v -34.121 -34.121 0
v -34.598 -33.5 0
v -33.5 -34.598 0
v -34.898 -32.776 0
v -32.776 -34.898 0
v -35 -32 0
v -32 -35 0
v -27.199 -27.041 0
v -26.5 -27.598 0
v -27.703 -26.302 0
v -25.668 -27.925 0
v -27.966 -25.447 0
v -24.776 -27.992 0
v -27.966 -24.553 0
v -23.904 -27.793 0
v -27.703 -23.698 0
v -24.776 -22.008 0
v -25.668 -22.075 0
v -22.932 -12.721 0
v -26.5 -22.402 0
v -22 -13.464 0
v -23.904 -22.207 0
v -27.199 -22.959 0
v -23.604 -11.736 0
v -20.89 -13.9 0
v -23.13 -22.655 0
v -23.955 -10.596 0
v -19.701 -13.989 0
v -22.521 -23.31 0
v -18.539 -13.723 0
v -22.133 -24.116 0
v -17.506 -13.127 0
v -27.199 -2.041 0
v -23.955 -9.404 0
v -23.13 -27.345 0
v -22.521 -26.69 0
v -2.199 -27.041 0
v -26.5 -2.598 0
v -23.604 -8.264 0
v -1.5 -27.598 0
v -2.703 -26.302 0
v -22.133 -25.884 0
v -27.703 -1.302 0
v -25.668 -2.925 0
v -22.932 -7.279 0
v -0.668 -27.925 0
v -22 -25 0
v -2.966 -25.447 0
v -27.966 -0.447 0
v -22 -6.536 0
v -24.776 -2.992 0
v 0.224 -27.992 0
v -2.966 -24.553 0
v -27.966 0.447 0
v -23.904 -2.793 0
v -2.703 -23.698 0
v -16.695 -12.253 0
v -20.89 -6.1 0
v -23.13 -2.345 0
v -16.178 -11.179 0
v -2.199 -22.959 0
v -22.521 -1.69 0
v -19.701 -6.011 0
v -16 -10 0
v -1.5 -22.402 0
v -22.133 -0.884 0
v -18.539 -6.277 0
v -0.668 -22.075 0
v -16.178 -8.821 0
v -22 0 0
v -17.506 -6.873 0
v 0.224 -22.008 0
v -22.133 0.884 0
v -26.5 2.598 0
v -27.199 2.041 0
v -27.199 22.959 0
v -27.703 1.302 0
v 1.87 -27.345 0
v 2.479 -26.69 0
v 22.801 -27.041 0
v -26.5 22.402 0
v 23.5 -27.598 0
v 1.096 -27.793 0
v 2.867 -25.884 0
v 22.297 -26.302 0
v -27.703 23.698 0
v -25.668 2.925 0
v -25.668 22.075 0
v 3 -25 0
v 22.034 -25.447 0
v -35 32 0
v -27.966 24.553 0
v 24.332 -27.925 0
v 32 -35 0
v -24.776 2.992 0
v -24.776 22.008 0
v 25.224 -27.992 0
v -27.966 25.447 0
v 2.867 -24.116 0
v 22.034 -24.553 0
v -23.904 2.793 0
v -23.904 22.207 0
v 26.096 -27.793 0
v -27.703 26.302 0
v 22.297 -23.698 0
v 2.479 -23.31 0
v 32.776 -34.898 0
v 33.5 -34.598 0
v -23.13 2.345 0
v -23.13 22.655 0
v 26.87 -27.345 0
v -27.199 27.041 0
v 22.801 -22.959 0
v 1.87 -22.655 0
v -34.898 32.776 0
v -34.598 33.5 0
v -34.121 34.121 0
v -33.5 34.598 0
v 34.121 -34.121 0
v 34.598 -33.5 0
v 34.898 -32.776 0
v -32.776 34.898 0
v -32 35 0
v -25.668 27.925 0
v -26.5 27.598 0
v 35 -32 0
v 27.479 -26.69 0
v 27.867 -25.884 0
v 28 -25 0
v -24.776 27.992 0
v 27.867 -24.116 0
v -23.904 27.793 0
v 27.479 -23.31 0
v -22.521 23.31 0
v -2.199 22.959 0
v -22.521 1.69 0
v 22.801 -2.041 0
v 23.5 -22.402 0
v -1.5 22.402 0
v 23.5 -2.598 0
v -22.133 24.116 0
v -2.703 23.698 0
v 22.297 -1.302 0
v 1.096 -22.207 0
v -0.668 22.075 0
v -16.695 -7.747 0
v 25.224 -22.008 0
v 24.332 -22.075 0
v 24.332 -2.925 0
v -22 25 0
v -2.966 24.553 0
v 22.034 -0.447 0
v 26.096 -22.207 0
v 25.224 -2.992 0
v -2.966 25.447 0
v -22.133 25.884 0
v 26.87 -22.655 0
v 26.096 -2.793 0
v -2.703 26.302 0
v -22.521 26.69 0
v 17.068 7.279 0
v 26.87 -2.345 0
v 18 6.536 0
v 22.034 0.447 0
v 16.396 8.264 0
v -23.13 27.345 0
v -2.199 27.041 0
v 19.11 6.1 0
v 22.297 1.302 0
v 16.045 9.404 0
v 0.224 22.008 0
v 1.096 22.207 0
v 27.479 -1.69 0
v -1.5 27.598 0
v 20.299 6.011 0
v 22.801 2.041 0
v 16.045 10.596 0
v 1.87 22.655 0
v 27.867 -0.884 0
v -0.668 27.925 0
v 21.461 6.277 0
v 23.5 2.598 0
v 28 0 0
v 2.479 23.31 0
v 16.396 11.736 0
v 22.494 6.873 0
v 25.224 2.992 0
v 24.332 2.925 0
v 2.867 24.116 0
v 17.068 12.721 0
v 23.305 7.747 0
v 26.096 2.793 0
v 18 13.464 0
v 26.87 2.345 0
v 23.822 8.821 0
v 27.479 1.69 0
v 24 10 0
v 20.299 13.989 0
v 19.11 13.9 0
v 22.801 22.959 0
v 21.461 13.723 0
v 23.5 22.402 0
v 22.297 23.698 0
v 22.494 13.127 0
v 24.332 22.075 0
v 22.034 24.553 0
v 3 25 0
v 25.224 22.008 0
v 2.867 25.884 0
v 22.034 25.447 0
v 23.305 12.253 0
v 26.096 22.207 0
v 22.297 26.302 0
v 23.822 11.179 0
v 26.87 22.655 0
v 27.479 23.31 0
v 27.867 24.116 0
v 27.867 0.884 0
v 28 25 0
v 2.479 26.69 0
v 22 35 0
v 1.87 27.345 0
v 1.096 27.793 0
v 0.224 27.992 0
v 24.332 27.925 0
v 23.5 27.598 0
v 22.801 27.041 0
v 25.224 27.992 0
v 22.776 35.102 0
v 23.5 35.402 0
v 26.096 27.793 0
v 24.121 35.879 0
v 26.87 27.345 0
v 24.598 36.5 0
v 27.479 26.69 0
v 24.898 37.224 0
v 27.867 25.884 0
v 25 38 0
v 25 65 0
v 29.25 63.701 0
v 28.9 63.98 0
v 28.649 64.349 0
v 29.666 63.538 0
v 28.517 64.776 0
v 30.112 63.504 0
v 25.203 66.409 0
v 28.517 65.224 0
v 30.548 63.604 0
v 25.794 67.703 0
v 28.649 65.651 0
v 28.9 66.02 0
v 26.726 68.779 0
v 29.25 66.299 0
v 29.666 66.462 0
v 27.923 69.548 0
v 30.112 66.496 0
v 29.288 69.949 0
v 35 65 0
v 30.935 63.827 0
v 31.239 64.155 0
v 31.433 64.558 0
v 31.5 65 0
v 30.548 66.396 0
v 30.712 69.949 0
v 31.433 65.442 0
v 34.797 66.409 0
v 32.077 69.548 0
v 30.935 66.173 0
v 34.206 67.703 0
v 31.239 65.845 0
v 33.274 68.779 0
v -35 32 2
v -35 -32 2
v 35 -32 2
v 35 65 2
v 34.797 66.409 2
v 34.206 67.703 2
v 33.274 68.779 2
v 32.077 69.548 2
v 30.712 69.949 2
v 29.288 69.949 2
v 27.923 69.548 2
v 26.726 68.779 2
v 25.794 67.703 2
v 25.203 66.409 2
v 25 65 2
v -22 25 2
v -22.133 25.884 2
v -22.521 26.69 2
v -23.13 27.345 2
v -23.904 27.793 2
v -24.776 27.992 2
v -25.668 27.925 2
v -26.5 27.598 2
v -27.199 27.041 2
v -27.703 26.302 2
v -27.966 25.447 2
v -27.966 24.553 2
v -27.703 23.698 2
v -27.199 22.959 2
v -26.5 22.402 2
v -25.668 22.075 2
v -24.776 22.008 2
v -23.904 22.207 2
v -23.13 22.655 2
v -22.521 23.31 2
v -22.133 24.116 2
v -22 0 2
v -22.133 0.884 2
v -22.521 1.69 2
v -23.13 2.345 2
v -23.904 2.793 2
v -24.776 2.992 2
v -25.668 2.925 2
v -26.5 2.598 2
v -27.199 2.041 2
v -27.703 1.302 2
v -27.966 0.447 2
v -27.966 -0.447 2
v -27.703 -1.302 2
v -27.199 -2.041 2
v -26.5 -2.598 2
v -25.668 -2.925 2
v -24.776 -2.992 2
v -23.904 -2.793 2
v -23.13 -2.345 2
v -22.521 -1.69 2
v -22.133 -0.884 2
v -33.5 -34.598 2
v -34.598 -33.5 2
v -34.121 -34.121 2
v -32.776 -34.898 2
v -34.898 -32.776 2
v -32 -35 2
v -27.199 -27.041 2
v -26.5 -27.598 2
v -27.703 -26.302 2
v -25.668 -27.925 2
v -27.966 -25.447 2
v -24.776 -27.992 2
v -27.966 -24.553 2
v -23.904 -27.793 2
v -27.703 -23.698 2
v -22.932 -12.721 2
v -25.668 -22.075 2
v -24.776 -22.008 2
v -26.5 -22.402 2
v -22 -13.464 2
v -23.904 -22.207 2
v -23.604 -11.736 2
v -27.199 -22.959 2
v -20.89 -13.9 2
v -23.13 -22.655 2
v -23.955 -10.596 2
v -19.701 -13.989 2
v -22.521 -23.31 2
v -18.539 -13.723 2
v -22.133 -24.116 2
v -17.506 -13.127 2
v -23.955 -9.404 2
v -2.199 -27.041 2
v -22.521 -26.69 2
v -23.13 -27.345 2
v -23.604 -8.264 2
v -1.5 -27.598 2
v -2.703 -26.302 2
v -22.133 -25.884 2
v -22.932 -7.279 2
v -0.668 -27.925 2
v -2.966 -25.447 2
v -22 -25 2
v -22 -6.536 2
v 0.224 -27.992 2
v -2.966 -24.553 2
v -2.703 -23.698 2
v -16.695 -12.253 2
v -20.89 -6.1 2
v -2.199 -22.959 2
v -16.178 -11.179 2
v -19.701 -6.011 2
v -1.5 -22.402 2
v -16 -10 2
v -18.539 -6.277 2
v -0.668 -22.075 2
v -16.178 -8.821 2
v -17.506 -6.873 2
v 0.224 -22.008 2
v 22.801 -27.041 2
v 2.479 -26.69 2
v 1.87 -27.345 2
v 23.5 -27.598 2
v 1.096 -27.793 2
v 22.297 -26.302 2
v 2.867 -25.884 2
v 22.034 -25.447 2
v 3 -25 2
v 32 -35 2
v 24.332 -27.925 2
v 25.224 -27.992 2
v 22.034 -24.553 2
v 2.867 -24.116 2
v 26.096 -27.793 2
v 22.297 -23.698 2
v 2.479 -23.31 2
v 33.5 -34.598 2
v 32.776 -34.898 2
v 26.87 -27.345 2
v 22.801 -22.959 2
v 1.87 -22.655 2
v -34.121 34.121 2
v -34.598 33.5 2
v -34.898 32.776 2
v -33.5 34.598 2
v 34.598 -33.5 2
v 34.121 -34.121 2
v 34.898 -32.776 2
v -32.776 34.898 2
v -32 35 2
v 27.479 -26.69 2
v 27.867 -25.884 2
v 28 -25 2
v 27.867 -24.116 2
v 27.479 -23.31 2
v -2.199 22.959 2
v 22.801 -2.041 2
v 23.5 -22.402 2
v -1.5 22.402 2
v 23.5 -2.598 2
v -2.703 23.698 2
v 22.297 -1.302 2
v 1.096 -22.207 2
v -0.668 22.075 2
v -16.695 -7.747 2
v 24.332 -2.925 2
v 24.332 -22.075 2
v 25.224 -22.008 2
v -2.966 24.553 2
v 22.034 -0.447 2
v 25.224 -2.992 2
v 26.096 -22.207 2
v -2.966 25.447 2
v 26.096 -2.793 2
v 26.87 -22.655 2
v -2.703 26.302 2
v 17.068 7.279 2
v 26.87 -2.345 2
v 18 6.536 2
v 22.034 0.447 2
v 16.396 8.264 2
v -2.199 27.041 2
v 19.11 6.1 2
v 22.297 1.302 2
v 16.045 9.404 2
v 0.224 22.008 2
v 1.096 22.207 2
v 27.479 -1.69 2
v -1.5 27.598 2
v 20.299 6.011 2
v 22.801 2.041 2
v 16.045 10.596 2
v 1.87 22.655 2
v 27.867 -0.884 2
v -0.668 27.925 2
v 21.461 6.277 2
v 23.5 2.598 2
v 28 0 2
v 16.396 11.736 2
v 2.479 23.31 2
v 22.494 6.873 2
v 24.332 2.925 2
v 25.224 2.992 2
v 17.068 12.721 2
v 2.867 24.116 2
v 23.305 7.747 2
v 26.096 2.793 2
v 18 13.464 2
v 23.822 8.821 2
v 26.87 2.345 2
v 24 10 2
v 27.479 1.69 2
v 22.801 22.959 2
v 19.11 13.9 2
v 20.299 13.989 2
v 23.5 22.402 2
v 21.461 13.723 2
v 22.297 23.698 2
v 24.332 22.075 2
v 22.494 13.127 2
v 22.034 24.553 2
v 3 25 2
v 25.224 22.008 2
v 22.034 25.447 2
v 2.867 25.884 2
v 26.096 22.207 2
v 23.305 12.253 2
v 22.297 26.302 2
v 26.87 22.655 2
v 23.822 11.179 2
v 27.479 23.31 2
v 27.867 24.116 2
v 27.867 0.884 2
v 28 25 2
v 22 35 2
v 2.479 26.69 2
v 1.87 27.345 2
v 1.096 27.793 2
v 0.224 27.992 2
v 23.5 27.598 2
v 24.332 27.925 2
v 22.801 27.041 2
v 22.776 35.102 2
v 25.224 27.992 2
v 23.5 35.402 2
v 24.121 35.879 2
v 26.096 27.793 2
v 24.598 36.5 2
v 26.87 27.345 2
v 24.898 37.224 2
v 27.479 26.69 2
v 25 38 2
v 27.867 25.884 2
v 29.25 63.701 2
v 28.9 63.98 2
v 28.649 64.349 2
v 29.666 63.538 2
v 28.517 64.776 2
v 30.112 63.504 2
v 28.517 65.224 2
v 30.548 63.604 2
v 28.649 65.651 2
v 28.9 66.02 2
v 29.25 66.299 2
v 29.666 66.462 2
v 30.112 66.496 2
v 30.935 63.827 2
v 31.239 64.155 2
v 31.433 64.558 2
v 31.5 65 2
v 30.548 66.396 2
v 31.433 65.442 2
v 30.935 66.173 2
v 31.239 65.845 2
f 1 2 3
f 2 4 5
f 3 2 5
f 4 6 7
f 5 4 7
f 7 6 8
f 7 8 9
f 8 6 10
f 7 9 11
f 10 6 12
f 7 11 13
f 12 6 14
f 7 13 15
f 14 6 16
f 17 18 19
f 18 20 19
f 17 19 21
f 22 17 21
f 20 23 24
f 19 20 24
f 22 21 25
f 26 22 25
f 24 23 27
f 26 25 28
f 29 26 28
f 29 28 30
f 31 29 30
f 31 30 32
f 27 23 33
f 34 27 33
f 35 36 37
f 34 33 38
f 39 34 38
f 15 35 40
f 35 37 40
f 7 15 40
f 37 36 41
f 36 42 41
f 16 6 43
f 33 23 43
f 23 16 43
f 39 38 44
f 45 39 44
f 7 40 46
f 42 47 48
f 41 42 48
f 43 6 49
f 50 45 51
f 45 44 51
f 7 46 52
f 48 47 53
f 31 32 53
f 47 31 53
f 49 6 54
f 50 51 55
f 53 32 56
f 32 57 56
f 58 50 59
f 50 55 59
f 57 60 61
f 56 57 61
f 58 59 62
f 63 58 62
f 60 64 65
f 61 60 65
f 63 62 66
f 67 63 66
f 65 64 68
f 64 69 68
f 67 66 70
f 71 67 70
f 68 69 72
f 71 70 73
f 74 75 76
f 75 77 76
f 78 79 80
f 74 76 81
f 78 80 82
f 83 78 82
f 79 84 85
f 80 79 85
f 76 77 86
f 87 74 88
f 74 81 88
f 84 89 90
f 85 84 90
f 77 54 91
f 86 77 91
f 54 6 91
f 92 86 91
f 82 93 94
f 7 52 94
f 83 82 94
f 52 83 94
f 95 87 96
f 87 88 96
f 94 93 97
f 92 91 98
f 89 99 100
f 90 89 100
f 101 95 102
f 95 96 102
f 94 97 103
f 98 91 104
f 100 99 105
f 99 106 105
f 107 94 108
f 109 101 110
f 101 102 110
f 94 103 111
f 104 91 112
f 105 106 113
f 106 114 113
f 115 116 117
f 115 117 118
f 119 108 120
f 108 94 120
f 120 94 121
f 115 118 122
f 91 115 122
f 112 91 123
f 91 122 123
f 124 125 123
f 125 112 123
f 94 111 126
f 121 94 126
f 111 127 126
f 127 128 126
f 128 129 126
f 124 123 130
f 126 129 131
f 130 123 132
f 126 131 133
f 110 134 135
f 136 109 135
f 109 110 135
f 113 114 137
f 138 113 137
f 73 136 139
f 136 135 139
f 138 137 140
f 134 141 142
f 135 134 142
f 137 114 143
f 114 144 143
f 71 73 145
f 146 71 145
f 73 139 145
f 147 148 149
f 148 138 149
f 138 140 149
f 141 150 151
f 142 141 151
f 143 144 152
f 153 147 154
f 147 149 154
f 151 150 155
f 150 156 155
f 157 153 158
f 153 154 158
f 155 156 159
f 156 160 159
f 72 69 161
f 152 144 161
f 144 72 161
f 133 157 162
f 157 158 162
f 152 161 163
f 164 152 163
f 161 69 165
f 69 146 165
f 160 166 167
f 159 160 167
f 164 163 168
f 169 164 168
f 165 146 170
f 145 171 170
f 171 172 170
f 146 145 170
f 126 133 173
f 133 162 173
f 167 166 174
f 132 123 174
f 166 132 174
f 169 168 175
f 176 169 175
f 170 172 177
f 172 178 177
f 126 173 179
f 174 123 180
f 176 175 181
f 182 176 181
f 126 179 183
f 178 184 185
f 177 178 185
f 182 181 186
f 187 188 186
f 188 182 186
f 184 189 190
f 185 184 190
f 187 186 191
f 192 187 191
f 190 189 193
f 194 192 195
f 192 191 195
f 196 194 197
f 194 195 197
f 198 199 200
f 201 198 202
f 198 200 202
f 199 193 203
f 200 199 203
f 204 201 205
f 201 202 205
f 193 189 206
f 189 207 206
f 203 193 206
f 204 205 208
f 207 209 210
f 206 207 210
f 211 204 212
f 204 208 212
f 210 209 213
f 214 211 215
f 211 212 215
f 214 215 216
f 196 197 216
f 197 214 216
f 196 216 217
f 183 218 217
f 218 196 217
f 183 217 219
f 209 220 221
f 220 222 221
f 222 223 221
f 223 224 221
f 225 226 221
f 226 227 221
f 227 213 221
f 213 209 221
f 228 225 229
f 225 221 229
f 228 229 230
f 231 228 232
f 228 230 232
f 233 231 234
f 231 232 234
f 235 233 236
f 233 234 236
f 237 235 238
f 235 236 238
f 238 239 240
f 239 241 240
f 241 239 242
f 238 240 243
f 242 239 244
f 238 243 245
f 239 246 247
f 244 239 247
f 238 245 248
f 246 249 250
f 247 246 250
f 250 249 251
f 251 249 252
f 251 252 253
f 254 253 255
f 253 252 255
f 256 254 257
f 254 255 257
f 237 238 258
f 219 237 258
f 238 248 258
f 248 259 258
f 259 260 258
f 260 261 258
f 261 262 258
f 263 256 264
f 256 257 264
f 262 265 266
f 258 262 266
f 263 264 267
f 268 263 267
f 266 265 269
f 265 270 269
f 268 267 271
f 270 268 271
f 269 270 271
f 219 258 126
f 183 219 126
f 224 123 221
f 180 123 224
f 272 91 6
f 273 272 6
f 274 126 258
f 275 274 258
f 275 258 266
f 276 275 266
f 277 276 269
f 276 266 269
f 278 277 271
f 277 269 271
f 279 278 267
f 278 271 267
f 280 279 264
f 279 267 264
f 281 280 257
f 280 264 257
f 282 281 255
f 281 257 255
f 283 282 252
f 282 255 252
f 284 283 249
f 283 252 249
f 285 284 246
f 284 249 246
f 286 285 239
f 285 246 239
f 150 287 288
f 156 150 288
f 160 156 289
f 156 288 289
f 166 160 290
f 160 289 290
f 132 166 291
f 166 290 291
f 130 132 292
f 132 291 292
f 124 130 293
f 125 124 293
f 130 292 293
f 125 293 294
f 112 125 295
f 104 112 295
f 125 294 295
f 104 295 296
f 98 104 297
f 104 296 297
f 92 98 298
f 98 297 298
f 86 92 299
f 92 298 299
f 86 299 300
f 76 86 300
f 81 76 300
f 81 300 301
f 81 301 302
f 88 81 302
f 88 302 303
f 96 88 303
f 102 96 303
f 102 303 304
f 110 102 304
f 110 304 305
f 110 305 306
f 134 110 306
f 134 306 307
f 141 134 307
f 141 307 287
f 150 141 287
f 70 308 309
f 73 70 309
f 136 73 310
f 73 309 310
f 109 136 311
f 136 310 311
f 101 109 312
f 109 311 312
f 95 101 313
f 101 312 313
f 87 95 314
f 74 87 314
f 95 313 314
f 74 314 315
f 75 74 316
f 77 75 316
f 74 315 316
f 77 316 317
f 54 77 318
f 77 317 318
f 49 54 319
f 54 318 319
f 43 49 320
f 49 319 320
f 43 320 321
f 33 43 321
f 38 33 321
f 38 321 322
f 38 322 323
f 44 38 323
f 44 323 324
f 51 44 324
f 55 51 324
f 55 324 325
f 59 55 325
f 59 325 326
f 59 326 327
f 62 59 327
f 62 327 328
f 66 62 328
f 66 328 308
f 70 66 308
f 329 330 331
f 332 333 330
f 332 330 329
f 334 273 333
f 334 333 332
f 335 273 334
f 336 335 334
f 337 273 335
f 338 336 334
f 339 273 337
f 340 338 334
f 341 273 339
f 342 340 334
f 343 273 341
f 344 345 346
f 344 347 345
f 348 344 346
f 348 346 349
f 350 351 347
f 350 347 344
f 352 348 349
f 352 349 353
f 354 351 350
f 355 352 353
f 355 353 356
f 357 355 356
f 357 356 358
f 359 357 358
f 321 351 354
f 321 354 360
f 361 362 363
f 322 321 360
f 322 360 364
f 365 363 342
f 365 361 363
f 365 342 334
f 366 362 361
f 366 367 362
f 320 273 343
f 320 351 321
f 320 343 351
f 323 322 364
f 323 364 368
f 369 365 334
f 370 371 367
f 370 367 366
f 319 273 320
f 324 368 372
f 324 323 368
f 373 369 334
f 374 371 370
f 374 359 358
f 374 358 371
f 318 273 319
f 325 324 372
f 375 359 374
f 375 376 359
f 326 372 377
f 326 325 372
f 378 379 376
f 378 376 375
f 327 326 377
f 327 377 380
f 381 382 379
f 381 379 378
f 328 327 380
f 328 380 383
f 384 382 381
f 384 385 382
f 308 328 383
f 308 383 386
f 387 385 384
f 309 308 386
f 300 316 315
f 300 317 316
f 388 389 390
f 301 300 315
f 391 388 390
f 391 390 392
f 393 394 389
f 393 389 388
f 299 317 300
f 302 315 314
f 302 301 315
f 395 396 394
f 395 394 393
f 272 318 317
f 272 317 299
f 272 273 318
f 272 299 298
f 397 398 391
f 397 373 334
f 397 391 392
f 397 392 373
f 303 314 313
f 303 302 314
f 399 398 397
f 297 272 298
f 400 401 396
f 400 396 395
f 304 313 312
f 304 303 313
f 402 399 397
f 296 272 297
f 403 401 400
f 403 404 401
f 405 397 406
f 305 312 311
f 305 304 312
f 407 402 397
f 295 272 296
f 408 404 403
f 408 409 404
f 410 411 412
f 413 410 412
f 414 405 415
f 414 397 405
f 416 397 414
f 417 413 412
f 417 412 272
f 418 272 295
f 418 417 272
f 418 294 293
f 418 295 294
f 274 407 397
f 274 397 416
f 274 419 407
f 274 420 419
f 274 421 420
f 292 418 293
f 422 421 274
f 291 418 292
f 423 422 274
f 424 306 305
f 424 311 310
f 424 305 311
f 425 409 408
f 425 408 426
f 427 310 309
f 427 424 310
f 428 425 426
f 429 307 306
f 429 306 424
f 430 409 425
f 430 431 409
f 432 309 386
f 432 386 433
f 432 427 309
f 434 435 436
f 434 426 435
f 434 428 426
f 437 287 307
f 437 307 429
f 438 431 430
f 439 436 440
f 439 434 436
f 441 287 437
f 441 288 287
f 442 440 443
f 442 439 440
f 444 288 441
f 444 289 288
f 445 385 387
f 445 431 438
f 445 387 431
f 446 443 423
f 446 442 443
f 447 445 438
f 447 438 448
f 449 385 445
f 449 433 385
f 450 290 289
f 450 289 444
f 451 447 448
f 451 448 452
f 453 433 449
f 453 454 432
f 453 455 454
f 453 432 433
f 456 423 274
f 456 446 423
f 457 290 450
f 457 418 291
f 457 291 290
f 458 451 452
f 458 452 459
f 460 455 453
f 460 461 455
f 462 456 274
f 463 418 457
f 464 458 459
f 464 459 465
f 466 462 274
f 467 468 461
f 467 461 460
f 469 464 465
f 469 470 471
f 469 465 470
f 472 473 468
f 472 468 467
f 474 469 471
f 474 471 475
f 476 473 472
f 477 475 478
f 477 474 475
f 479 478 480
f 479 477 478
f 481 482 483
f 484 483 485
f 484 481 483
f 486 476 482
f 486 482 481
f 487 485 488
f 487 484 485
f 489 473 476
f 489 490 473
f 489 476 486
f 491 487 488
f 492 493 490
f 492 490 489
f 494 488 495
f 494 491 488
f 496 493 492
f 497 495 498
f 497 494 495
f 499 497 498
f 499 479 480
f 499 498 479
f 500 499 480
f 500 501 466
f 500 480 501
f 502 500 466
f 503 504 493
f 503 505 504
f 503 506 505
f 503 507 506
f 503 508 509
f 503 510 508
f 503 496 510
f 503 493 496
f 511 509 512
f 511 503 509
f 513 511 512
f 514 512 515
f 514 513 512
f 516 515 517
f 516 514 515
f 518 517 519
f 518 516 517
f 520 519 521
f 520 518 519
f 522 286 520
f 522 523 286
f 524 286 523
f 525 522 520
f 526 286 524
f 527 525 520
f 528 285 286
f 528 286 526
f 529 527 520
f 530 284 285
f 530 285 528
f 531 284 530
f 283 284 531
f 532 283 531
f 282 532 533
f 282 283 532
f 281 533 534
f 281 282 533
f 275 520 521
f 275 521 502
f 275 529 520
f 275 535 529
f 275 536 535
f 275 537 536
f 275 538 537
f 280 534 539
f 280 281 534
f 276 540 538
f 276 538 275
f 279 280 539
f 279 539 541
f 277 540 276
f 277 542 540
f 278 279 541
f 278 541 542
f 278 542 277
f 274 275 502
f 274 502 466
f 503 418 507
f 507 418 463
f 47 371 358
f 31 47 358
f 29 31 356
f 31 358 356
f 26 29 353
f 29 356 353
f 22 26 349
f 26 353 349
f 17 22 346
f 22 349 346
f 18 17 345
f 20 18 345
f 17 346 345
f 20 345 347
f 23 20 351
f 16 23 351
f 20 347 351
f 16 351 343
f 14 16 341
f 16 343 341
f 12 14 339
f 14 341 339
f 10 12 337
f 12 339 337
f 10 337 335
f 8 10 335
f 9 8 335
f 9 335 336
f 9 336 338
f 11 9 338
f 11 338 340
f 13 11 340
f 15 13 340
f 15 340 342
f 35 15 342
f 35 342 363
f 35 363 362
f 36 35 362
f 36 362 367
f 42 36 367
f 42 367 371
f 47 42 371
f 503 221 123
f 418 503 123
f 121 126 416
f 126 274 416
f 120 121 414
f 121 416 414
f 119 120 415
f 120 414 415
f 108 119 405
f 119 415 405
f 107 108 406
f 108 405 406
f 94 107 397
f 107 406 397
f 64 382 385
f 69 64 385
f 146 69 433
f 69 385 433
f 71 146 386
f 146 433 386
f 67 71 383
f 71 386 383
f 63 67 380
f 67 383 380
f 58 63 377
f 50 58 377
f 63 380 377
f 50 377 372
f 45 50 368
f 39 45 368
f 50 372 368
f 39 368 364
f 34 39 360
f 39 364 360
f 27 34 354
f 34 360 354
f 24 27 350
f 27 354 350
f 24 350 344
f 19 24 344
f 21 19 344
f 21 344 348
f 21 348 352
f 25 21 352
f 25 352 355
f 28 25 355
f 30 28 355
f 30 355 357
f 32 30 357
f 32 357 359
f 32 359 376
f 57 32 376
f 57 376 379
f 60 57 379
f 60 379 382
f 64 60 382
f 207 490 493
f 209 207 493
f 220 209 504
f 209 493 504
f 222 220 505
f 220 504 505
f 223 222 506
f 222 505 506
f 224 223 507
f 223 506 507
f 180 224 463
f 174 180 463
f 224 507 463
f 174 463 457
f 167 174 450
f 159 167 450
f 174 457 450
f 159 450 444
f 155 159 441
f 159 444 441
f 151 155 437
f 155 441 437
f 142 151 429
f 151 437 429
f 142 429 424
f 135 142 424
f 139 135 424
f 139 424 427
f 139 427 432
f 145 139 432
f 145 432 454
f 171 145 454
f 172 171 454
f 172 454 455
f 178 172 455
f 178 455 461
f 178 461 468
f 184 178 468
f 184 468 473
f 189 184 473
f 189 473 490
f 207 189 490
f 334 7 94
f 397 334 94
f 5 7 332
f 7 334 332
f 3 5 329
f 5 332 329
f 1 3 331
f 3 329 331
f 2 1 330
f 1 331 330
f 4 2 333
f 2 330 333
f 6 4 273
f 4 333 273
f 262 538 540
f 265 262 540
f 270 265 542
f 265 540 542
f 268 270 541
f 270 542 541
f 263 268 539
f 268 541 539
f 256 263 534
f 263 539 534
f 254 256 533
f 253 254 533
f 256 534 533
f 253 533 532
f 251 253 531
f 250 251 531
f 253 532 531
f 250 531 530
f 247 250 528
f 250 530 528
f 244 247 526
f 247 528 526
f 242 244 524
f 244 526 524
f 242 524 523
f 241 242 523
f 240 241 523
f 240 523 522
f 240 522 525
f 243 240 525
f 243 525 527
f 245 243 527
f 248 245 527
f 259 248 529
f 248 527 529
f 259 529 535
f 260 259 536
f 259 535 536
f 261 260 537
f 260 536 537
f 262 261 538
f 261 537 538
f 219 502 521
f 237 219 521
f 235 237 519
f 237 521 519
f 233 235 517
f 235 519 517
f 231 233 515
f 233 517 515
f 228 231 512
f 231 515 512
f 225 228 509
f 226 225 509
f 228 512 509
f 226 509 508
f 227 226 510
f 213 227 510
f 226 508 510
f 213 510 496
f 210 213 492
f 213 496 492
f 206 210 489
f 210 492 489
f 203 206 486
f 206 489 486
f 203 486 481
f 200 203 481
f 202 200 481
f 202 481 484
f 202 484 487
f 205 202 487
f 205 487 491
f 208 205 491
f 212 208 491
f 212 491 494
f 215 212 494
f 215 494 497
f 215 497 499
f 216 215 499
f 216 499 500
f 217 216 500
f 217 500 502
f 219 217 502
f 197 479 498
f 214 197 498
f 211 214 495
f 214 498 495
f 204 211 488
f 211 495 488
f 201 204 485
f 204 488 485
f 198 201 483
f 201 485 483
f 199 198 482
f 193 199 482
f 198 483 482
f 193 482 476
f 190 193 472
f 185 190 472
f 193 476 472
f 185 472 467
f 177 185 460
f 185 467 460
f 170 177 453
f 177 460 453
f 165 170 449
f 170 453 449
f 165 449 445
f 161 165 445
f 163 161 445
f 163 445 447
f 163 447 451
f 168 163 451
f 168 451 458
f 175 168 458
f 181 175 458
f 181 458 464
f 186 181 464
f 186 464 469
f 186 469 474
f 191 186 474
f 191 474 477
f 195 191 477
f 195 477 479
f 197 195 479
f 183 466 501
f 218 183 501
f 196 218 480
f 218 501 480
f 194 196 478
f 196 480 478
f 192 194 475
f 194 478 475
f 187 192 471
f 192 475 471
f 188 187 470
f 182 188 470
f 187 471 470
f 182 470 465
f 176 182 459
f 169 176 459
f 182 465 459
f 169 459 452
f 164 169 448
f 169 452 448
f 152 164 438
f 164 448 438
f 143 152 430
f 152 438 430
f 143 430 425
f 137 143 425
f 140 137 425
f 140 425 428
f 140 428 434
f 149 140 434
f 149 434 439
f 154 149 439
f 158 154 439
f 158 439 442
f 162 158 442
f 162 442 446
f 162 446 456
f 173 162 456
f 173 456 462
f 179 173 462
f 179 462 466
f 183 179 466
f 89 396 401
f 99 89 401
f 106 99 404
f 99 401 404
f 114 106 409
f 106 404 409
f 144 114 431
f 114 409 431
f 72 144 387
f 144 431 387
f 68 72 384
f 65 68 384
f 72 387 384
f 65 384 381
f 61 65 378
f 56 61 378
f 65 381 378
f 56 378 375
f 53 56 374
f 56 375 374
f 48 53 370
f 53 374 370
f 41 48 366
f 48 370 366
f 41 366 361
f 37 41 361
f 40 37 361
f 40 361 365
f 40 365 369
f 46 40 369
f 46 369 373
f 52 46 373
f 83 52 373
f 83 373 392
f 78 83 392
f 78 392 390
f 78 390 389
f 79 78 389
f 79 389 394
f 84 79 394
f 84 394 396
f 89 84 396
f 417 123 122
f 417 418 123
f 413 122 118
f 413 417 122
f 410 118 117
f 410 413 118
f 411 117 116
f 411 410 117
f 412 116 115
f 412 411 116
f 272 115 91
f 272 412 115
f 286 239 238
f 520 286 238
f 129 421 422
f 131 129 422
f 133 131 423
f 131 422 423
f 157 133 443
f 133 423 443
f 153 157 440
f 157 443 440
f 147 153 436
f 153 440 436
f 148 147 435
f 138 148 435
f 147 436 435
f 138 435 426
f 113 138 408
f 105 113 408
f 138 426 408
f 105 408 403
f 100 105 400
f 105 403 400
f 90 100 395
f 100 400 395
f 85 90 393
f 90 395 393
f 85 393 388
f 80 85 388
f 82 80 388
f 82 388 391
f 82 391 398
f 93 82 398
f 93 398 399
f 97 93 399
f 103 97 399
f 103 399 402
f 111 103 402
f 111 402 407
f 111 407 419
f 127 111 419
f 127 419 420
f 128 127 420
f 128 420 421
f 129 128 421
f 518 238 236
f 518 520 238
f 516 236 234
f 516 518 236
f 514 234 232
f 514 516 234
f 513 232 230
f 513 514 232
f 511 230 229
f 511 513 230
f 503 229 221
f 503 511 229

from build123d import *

# Parameters (mm, degrees)
BOSS_EXTRUDE1_DEPTH = 2
SKETCH2_R           = 1.5
CUT_EXTRUDE1_DEPTH  = 2
SKETCH3_R           = 3
SKETCH3_R_2         = 4
CUT_EXTRUDE2_DEPTH  = 10
FILLET1_R           = 3


with BuildPart() as part:
    # Sketch1 → Boss-Extrude1 (new body)
    with BuildSketch(Plane.XY):
        with BuildLine():
            Line((35, 35), (35, 65))
            ThreePointArc((35, 65), (30, 70), (25, 65))
            Line((25, 65), (25, 35))
            Line((25, 35), (-35, 35))
            Line((-35, 35), (-35, -35))
            Line((-35, -35), (35, -35))
            Line((35, -35), (35, 35))
        make_face()
    extrude(amount=BOSS_EXTRUDE1_DEPTH)

    # Sketch2 → Cut-Extrude1 (cut)
    with BuildSketch(Plane.XY.offset(2)):
        with Locations((30, 65)):
            Circle(SKETCH2_R)
    extrude(amount=-CUT_EXTRUDE1_DEPTH, mode=Mode.SUBTRACT)

    # Sketch3 → Cut-Extrude2 (cut)
    with BuildSketch(Plane.XY.offset(2)):
        with Locations((0, 25)):
            Circle(SKETCH3_R)
        with Locations((25, 25)):
            Circle(SKETCH3_R)
        with Locations((25, 0)):
            Circle(SKETCH3_R)
        with Locations((25, -25)):
            Circle(SKETCH3_R)
        with Locations((0, -25)):
            Circle(SKETCH3_R)
        with Locations((-25, -25)):
            Circle(SKETCH3_R)
        with Locations((-25, 0)):
            Circle(SKETCH3_R)
        with Locations((-25, 25)):
            Circle(SKETCH3_R)
        with Locations((-20, -10)):
            Circle(SKETCH3_R_2)
        with Locations((20, 10)):
            Circle(SKETCH3_R_2)
    extrude(amount=-CUT_EXTRUDE2_DEPTH, mode=Mode.SUBTRACT)

    # Fillet1
    fillet1_edges = [part.edges().sort_by_distance(p)[0] for p in [
        (35, -35, 1),
        (-35, -35, 1),
        (-35, 35, 1),
        (25, 35, 1),
    ]]
    fillet(fillet1_edges, radius=FILLET1_R)


solid = part.part
